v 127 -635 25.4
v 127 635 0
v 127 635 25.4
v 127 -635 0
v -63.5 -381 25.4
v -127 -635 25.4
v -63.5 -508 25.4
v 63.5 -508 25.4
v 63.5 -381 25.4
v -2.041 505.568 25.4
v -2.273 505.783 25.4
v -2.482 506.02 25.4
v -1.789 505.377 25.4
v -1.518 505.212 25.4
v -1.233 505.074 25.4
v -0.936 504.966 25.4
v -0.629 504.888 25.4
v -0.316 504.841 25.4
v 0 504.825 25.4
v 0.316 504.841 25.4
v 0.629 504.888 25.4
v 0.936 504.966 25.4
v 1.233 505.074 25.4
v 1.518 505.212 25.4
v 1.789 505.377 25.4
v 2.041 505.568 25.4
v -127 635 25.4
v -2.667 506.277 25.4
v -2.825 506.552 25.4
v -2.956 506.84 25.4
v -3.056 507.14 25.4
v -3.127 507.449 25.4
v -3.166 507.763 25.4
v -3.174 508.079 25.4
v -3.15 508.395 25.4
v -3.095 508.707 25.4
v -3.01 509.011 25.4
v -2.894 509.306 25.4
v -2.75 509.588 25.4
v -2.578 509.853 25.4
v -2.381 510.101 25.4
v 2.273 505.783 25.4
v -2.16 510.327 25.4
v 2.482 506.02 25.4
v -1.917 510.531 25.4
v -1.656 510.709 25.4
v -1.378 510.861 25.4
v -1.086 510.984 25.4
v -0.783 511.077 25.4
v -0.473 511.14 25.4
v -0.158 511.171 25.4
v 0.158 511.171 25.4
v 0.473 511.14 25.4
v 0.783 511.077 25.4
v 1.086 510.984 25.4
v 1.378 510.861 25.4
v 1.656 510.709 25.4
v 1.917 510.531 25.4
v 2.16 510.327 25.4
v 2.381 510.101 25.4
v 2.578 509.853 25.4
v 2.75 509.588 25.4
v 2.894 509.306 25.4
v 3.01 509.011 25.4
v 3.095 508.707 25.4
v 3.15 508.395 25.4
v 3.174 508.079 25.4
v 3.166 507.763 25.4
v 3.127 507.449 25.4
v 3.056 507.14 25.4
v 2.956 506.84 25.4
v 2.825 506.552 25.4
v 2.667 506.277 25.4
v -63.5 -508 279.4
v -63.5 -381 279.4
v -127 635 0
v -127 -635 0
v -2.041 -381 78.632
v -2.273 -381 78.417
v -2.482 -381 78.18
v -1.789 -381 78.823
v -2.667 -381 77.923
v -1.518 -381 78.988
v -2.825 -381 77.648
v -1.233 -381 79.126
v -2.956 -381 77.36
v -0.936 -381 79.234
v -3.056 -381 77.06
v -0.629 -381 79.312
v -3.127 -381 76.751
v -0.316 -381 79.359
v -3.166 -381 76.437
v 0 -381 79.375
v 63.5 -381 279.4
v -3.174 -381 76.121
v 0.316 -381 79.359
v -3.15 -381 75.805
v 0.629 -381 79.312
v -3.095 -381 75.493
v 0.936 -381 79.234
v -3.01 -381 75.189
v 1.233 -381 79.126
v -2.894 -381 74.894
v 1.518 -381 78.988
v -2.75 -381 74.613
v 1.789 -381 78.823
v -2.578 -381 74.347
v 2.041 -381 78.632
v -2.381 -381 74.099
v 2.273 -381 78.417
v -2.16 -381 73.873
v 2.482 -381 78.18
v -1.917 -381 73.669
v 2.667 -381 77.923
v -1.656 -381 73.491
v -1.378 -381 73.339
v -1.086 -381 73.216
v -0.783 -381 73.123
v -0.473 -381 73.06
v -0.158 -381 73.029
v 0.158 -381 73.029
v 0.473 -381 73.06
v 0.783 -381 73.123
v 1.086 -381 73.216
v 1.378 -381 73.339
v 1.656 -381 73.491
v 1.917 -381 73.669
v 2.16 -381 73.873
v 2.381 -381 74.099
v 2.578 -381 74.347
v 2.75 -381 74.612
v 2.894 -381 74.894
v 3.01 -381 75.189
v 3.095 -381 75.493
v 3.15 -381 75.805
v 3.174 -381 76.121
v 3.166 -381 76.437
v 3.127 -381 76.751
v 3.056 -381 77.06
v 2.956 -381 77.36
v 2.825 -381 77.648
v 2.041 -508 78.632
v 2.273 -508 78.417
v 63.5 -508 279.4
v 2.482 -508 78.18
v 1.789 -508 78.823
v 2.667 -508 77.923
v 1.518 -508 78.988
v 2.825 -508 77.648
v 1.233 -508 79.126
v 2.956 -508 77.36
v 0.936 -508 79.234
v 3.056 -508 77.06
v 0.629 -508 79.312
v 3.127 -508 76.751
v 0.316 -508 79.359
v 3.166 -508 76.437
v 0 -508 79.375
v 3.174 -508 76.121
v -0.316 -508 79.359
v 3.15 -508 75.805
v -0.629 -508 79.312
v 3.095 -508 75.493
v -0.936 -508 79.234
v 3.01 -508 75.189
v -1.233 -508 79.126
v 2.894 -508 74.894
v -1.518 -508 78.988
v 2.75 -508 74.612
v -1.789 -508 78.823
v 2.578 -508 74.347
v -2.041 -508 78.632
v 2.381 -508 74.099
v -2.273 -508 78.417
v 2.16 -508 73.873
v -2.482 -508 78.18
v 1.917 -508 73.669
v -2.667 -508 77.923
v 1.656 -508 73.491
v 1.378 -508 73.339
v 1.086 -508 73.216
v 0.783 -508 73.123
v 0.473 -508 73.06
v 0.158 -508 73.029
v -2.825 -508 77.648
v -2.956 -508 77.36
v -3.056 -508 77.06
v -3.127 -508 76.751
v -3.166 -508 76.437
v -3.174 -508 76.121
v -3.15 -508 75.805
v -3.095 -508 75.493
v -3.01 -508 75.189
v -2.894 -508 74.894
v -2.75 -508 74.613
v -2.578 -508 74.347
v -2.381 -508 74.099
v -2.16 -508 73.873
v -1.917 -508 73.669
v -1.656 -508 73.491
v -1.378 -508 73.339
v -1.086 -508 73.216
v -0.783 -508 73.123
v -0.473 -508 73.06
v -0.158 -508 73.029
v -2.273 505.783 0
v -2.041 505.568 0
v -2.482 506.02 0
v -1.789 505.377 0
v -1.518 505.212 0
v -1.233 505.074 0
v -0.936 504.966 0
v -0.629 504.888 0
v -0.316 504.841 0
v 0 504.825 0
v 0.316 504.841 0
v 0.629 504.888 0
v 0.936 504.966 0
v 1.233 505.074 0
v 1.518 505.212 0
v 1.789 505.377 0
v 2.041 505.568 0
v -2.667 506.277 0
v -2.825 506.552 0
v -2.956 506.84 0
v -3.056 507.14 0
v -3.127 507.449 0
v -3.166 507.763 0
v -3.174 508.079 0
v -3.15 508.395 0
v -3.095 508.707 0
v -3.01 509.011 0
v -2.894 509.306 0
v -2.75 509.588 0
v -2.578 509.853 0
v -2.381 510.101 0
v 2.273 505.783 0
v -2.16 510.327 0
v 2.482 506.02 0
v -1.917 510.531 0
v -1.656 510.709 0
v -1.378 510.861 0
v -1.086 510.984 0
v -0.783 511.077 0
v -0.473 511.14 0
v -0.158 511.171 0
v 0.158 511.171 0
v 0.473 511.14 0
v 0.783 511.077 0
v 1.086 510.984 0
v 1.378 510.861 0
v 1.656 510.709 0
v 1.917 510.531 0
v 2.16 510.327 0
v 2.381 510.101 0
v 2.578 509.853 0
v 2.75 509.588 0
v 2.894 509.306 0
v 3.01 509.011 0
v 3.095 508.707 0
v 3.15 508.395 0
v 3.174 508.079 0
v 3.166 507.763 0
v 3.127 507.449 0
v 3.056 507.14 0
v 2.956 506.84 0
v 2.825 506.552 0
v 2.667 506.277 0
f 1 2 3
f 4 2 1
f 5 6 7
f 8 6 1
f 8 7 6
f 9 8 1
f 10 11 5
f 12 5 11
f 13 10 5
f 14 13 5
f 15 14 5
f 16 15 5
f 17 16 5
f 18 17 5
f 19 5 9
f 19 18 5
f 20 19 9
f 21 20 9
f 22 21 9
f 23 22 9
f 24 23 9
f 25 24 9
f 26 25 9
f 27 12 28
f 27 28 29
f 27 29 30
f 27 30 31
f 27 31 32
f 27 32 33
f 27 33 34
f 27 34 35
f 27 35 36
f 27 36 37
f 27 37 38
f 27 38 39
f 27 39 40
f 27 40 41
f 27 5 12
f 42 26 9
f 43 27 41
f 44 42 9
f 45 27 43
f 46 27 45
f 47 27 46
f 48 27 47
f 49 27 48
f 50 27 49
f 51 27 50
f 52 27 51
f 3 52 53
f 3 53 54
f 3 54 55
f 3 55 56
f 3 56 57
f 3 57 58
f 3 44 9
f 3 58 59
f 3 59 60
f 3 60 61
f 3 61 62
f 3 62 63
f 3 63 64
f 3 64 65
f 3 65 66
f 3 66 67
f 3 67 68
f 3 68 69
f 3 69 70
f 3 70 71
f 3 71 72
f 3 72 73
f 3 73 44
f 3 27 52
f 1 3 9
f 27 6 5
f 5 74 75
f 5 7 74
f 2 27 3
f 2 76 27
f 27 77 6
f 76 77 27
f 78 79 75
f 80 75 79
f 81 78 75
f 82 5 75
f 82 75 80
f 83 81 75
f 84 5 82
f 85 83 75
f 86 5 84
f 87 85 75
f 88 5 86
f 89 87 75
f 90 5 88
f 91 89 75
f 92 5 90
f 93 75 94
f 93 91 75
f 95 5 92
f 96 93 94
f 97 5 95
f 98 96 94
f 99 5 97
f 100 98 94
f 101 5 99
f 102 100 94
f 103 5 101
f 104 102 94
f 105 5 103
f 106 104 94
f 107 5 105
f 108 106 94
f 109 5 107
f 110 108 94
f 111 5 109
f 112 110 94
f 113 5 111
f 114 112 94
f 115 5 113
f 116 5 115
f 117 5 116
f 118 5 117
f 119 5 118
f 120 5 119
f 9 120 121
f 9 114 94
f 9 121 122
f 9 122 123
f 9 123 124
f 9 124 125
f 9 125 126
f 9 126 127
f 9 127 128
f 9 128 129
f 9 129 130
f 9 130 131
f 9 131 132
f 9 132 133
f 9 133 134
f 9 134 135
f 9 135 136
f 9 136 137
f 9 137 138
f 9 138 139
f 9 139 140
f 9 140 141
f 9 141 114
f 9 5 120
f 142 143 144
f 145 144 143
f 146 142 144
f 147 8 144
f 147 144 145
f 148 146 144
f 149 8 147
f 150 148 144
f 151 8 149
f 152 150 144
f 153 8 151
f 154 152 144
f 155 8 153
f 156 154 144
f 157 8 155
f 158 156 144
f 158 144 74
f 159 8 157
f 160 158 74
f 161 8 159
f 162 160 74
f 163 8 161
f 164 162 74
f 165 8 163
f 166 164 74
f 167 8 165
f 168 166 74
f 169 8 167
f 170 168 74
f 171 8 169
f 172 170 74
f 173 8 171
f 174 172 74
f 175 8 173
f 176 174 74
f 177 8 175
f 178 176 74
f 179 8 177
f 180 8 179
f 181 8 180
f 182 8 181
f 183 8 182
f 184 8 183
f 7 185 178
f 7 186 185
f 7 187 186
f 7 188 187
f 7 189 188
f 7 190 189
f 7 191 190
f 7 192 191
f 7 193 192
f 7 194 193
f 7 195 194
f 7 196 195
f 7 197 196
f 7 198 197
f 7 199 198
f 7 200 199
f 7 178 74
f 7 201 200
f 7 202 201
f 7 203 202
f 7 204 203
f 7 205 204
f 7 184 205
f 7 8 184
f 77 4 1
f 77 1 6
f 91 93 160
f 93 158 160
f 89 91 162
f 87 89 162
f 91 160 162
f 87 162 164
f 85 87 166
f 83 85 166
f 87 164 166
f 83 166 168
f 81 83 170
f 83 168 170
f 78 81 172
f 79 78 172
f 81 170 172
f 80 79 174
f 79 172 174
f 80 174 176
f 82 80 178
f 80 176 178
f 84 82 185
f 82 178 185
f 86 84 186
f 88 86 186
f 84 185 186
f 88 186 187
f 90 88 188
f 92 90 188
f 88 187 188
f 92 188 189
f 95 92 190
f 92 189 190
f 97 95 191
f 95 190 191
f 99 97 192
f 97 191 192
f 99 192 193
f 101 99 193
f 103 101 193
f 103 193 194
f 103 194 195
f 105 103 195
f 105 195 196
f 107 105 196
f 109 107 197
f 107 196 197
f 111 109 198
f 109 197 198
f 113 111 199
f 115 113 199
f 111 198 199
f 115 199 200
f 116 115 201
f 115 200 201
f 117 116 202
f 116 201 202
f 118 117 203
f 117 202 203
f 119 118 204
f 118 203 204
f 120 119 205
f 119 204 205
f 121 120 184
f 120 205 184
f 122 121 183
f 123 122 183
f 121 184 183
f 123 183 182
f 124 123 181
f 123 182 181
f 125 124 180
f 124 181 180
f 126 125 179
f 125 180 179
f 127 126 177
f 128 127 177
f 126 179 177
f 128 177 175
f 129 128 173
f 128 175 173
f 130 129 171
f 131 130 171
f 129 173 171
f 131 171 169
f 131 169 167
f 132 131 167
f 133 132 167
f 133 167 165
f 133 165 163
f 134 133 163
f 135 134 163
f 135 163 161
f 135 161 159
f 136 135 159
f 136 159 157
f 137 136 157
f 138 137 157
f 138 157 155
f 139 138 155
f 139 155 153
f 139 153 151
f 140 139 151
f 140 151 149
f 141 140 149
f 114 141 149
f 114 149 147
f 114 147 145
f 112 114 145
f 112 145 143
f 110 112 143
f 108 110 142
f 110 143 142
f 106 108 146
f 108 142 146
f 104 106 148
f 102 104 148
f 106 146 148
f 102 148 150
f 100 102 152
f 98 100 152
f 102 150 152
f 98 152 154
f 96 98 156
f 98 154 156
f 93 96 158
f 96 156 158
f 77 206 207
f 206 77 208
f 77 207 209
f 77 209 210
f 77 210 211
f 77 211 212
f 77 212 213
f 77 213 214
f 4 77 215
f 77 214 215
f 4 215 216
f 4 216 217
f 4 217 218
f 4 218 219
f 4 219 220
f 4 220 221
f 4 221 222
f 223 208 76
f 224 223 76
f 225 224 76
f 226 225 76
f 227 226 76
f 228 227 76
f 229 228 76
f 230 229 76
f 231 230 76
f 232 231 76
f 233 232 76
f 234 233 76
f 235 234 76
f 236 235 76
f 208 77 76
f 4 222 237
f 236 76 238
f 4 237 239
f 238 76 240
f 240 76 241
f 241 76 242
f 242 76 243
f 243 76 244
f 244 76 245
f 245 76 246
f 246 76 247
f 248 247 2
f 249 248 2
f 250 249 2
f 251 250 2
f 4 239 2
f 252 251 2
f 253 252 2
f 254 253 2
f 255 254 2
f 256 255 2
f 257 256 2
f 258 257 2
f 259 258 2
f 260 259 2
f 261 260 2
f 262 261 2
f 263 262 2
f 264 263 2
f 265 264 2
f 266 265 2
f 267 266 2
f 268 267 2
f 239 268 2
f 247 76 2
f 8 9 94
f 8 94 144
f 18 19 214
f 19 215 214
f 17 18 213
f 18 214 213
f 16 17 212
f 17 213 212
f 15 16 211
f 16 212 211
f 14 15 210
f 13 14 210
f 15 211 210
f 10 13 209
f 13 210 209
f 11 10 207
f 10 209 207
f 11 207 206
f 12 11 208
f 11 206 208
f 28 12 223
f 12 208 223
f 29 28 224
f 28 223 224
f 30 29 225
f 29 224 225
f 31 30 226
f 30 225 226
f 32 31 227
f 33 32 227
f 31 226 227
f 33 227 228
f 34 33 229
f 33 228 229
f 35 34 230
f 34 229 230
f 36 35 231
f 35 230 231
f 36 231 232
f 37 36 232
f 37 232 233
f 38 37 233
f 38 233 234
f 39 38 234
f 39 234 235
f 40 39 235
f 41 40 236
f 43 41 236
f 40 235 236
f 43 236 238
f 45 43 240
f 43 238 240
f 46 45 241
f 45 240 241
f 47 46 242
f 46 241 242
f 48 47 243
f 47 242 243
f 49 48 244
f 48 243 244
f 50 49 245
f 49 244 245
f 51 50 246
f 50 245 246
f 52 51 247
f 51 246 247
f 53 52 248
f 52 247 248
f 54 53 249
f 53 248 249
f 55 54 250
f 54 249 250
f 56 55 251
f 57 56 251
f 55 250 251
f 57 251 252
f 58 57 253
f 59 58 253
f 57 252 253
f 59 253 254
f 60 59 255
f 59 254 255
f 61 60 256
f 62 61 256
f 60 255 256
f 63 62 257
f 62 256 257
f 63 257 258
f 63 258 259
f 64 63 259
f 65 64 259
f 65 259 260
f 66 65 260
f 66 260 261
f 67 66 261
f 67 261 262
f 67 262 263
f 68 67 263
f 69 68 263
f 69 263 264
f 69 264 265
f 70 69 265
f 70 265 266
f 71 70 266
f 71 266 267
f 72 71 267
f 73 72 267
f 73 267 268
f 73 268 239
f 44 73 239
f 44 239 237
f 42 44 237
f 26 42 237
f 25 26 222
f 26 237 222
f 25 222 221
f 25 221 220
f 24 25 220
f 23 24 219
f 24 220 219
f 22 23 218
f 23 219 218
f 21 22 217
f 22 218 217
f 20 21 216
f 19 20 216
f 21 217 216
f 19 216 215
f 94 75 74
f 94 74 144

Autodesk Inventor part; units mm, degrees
ref_plane "YZ Plane" through (0, 0, 0) normal (1, 0, 0) x (0, 1, 0)
ref_plane "XZ Plane" through (0, 0, 0) normal (0, 1, 0) x (-1, 0, 0)
ref_plane "XY Plane" through (0, 0, 0) normal (0, 0, 1) x (1, 0, 0)
sketch "Sketch1" plane through (0, 0, 0) normal (0, 0, 1) x (1, 0, 0)
  line L0 (-127, 635) -> (127, 635)
  line L1 (127, 635) -> (127, -635)
  line L2 (127, -635) -> (-127, -635)
  line L3 (-127, -635) -> (-127, 635)
  line L4 (-127, 635) -> (127, -635) construction
  line L5 (127, 635) -> (-127, -635) construction
  point P0 (0, 0)
  dimension "d0" = 254
  dimension "d1" = 1270
extrude "Extrusion1" add sketch "Sketch1" along normal blind 25.4
sketch "Sketch2" plane through (0, 0, 25.4) normal (0, 0, 1) x (1, 0, 0)
  line L0 (127, 635) -> (-127, 635) projected
  line L1 (-63.5, -381) -> (63.5, -381)
  line L2 (63.5, -381) -> (63.5, -508)
  line L3 (63.5, -508) -> (-63.5, -508)
  line L4 (-63.5, -508) -> (-63.5, -381)
  line L5 (-63.5, -381) -> (63.5, -508) construction
  line L6 (63.5, -381) -> (-63.5, -508) construction
  line L7 (0, 635) -> (0, 508)
  point P0 (0, 0)
  dimension "d5" = 127
  dimension "d6" = 127
  dimension "d7" = 127
hole "Hole1" at (0, 508, 25.4) direction (0, 0, -1) diameter 6.35 end through all
extrude "Extrusion2" add sketch "Sketch2" along normal blind 254
sketch "Sketch3" plane through (-63.5, -381, 25.4) normal (0, 1, 0) x (1, 0, 0)
  line L0 (127, -254) -> (0, -254) projected
  line L1 (127, 0) -> (127, -254) projected
  line L2 (63.5, -254) -> (63.5, -50.8)
  point P0 (63.5, 25.4)
  dimension "d17" = 203.2
hole "Hole2" at (0, -381, 76.2) direction (0, -1, 0) diameter 6.35 end through all
sketch "Sketch4" plane through (-63.5, -381, 25.4) normal (0, 1, 0) x (1, 0, 0)
  circle A0 centre (63.5, -50.8) radius 3.175 projected
  line L0 (0, 0) -> (127, 0) projected
  line L1 (0, 0) -> (0, -254) projected
  line L2 (127, -254) -> (0, -254) projected
  line L3 (127, 0) -> (127, -254) projected
  point P0 (63.5, 25.4)
  point P1 (63.5, -53.975)
properties part number "base"
